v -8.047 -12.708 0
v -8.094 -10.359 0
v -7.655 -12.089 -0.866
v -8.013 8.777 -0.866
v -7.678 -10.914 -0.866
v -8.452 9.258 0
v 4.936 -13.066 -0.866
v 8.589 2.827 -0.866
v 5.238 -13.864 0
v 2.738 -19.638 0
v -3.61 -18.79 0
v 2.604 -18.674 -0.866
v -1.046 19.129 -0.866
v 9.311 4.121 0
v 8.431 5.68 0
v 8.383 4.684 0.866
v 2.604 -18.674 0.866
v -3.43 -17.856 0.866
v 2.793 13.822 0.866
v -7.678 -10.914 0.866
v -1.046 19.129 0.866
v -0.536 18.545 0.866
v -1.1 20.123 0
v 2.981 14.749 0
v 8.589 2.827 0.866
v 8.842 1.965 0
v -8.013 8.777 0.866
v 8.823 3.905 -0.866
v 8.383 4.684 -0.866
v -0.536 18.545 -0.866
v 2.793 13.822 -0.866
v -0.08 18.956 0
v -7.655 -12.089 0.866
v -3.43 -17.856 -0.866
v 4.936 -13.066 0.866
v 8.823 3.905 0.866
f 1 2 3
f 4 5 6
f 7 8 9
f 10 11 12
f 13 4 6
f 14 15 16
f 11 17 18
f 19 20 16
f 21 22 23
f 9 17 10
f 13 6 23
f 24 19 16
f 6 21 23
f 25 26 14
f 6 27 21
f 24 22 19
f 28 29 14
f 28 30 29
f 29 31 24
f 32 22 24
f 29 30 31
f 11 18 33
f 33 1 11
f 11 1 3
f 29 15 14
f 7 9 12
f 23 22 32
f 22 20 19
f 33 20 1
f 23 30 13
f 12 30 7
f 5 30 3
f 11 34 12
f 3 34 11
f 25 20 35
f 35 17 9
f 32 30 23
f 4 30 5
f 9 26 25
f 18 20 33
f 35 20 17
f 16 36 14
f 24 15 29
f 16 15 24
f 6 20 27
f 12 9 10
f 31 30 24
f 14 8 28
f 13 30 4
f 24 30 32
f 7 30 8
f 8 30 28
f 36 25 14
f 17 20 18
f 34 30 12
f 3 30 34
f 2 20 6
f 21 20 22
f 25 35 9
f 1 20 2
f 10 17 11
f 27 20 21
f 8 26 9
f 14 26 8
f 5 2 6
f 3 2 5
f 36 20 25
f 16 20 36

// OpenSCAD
seed = 10;
hull() scale([1, 2,1]) for (ii=[1:50]) {
    r = rands(0, 360, 1, 10*ii*seed)[0];
    d = rands(0, 10, 1, 10*ii*seed +1)[0];
    rotate([0, 0, r])
        translate([d, 0, 0])
            sphere(1);
    
}
